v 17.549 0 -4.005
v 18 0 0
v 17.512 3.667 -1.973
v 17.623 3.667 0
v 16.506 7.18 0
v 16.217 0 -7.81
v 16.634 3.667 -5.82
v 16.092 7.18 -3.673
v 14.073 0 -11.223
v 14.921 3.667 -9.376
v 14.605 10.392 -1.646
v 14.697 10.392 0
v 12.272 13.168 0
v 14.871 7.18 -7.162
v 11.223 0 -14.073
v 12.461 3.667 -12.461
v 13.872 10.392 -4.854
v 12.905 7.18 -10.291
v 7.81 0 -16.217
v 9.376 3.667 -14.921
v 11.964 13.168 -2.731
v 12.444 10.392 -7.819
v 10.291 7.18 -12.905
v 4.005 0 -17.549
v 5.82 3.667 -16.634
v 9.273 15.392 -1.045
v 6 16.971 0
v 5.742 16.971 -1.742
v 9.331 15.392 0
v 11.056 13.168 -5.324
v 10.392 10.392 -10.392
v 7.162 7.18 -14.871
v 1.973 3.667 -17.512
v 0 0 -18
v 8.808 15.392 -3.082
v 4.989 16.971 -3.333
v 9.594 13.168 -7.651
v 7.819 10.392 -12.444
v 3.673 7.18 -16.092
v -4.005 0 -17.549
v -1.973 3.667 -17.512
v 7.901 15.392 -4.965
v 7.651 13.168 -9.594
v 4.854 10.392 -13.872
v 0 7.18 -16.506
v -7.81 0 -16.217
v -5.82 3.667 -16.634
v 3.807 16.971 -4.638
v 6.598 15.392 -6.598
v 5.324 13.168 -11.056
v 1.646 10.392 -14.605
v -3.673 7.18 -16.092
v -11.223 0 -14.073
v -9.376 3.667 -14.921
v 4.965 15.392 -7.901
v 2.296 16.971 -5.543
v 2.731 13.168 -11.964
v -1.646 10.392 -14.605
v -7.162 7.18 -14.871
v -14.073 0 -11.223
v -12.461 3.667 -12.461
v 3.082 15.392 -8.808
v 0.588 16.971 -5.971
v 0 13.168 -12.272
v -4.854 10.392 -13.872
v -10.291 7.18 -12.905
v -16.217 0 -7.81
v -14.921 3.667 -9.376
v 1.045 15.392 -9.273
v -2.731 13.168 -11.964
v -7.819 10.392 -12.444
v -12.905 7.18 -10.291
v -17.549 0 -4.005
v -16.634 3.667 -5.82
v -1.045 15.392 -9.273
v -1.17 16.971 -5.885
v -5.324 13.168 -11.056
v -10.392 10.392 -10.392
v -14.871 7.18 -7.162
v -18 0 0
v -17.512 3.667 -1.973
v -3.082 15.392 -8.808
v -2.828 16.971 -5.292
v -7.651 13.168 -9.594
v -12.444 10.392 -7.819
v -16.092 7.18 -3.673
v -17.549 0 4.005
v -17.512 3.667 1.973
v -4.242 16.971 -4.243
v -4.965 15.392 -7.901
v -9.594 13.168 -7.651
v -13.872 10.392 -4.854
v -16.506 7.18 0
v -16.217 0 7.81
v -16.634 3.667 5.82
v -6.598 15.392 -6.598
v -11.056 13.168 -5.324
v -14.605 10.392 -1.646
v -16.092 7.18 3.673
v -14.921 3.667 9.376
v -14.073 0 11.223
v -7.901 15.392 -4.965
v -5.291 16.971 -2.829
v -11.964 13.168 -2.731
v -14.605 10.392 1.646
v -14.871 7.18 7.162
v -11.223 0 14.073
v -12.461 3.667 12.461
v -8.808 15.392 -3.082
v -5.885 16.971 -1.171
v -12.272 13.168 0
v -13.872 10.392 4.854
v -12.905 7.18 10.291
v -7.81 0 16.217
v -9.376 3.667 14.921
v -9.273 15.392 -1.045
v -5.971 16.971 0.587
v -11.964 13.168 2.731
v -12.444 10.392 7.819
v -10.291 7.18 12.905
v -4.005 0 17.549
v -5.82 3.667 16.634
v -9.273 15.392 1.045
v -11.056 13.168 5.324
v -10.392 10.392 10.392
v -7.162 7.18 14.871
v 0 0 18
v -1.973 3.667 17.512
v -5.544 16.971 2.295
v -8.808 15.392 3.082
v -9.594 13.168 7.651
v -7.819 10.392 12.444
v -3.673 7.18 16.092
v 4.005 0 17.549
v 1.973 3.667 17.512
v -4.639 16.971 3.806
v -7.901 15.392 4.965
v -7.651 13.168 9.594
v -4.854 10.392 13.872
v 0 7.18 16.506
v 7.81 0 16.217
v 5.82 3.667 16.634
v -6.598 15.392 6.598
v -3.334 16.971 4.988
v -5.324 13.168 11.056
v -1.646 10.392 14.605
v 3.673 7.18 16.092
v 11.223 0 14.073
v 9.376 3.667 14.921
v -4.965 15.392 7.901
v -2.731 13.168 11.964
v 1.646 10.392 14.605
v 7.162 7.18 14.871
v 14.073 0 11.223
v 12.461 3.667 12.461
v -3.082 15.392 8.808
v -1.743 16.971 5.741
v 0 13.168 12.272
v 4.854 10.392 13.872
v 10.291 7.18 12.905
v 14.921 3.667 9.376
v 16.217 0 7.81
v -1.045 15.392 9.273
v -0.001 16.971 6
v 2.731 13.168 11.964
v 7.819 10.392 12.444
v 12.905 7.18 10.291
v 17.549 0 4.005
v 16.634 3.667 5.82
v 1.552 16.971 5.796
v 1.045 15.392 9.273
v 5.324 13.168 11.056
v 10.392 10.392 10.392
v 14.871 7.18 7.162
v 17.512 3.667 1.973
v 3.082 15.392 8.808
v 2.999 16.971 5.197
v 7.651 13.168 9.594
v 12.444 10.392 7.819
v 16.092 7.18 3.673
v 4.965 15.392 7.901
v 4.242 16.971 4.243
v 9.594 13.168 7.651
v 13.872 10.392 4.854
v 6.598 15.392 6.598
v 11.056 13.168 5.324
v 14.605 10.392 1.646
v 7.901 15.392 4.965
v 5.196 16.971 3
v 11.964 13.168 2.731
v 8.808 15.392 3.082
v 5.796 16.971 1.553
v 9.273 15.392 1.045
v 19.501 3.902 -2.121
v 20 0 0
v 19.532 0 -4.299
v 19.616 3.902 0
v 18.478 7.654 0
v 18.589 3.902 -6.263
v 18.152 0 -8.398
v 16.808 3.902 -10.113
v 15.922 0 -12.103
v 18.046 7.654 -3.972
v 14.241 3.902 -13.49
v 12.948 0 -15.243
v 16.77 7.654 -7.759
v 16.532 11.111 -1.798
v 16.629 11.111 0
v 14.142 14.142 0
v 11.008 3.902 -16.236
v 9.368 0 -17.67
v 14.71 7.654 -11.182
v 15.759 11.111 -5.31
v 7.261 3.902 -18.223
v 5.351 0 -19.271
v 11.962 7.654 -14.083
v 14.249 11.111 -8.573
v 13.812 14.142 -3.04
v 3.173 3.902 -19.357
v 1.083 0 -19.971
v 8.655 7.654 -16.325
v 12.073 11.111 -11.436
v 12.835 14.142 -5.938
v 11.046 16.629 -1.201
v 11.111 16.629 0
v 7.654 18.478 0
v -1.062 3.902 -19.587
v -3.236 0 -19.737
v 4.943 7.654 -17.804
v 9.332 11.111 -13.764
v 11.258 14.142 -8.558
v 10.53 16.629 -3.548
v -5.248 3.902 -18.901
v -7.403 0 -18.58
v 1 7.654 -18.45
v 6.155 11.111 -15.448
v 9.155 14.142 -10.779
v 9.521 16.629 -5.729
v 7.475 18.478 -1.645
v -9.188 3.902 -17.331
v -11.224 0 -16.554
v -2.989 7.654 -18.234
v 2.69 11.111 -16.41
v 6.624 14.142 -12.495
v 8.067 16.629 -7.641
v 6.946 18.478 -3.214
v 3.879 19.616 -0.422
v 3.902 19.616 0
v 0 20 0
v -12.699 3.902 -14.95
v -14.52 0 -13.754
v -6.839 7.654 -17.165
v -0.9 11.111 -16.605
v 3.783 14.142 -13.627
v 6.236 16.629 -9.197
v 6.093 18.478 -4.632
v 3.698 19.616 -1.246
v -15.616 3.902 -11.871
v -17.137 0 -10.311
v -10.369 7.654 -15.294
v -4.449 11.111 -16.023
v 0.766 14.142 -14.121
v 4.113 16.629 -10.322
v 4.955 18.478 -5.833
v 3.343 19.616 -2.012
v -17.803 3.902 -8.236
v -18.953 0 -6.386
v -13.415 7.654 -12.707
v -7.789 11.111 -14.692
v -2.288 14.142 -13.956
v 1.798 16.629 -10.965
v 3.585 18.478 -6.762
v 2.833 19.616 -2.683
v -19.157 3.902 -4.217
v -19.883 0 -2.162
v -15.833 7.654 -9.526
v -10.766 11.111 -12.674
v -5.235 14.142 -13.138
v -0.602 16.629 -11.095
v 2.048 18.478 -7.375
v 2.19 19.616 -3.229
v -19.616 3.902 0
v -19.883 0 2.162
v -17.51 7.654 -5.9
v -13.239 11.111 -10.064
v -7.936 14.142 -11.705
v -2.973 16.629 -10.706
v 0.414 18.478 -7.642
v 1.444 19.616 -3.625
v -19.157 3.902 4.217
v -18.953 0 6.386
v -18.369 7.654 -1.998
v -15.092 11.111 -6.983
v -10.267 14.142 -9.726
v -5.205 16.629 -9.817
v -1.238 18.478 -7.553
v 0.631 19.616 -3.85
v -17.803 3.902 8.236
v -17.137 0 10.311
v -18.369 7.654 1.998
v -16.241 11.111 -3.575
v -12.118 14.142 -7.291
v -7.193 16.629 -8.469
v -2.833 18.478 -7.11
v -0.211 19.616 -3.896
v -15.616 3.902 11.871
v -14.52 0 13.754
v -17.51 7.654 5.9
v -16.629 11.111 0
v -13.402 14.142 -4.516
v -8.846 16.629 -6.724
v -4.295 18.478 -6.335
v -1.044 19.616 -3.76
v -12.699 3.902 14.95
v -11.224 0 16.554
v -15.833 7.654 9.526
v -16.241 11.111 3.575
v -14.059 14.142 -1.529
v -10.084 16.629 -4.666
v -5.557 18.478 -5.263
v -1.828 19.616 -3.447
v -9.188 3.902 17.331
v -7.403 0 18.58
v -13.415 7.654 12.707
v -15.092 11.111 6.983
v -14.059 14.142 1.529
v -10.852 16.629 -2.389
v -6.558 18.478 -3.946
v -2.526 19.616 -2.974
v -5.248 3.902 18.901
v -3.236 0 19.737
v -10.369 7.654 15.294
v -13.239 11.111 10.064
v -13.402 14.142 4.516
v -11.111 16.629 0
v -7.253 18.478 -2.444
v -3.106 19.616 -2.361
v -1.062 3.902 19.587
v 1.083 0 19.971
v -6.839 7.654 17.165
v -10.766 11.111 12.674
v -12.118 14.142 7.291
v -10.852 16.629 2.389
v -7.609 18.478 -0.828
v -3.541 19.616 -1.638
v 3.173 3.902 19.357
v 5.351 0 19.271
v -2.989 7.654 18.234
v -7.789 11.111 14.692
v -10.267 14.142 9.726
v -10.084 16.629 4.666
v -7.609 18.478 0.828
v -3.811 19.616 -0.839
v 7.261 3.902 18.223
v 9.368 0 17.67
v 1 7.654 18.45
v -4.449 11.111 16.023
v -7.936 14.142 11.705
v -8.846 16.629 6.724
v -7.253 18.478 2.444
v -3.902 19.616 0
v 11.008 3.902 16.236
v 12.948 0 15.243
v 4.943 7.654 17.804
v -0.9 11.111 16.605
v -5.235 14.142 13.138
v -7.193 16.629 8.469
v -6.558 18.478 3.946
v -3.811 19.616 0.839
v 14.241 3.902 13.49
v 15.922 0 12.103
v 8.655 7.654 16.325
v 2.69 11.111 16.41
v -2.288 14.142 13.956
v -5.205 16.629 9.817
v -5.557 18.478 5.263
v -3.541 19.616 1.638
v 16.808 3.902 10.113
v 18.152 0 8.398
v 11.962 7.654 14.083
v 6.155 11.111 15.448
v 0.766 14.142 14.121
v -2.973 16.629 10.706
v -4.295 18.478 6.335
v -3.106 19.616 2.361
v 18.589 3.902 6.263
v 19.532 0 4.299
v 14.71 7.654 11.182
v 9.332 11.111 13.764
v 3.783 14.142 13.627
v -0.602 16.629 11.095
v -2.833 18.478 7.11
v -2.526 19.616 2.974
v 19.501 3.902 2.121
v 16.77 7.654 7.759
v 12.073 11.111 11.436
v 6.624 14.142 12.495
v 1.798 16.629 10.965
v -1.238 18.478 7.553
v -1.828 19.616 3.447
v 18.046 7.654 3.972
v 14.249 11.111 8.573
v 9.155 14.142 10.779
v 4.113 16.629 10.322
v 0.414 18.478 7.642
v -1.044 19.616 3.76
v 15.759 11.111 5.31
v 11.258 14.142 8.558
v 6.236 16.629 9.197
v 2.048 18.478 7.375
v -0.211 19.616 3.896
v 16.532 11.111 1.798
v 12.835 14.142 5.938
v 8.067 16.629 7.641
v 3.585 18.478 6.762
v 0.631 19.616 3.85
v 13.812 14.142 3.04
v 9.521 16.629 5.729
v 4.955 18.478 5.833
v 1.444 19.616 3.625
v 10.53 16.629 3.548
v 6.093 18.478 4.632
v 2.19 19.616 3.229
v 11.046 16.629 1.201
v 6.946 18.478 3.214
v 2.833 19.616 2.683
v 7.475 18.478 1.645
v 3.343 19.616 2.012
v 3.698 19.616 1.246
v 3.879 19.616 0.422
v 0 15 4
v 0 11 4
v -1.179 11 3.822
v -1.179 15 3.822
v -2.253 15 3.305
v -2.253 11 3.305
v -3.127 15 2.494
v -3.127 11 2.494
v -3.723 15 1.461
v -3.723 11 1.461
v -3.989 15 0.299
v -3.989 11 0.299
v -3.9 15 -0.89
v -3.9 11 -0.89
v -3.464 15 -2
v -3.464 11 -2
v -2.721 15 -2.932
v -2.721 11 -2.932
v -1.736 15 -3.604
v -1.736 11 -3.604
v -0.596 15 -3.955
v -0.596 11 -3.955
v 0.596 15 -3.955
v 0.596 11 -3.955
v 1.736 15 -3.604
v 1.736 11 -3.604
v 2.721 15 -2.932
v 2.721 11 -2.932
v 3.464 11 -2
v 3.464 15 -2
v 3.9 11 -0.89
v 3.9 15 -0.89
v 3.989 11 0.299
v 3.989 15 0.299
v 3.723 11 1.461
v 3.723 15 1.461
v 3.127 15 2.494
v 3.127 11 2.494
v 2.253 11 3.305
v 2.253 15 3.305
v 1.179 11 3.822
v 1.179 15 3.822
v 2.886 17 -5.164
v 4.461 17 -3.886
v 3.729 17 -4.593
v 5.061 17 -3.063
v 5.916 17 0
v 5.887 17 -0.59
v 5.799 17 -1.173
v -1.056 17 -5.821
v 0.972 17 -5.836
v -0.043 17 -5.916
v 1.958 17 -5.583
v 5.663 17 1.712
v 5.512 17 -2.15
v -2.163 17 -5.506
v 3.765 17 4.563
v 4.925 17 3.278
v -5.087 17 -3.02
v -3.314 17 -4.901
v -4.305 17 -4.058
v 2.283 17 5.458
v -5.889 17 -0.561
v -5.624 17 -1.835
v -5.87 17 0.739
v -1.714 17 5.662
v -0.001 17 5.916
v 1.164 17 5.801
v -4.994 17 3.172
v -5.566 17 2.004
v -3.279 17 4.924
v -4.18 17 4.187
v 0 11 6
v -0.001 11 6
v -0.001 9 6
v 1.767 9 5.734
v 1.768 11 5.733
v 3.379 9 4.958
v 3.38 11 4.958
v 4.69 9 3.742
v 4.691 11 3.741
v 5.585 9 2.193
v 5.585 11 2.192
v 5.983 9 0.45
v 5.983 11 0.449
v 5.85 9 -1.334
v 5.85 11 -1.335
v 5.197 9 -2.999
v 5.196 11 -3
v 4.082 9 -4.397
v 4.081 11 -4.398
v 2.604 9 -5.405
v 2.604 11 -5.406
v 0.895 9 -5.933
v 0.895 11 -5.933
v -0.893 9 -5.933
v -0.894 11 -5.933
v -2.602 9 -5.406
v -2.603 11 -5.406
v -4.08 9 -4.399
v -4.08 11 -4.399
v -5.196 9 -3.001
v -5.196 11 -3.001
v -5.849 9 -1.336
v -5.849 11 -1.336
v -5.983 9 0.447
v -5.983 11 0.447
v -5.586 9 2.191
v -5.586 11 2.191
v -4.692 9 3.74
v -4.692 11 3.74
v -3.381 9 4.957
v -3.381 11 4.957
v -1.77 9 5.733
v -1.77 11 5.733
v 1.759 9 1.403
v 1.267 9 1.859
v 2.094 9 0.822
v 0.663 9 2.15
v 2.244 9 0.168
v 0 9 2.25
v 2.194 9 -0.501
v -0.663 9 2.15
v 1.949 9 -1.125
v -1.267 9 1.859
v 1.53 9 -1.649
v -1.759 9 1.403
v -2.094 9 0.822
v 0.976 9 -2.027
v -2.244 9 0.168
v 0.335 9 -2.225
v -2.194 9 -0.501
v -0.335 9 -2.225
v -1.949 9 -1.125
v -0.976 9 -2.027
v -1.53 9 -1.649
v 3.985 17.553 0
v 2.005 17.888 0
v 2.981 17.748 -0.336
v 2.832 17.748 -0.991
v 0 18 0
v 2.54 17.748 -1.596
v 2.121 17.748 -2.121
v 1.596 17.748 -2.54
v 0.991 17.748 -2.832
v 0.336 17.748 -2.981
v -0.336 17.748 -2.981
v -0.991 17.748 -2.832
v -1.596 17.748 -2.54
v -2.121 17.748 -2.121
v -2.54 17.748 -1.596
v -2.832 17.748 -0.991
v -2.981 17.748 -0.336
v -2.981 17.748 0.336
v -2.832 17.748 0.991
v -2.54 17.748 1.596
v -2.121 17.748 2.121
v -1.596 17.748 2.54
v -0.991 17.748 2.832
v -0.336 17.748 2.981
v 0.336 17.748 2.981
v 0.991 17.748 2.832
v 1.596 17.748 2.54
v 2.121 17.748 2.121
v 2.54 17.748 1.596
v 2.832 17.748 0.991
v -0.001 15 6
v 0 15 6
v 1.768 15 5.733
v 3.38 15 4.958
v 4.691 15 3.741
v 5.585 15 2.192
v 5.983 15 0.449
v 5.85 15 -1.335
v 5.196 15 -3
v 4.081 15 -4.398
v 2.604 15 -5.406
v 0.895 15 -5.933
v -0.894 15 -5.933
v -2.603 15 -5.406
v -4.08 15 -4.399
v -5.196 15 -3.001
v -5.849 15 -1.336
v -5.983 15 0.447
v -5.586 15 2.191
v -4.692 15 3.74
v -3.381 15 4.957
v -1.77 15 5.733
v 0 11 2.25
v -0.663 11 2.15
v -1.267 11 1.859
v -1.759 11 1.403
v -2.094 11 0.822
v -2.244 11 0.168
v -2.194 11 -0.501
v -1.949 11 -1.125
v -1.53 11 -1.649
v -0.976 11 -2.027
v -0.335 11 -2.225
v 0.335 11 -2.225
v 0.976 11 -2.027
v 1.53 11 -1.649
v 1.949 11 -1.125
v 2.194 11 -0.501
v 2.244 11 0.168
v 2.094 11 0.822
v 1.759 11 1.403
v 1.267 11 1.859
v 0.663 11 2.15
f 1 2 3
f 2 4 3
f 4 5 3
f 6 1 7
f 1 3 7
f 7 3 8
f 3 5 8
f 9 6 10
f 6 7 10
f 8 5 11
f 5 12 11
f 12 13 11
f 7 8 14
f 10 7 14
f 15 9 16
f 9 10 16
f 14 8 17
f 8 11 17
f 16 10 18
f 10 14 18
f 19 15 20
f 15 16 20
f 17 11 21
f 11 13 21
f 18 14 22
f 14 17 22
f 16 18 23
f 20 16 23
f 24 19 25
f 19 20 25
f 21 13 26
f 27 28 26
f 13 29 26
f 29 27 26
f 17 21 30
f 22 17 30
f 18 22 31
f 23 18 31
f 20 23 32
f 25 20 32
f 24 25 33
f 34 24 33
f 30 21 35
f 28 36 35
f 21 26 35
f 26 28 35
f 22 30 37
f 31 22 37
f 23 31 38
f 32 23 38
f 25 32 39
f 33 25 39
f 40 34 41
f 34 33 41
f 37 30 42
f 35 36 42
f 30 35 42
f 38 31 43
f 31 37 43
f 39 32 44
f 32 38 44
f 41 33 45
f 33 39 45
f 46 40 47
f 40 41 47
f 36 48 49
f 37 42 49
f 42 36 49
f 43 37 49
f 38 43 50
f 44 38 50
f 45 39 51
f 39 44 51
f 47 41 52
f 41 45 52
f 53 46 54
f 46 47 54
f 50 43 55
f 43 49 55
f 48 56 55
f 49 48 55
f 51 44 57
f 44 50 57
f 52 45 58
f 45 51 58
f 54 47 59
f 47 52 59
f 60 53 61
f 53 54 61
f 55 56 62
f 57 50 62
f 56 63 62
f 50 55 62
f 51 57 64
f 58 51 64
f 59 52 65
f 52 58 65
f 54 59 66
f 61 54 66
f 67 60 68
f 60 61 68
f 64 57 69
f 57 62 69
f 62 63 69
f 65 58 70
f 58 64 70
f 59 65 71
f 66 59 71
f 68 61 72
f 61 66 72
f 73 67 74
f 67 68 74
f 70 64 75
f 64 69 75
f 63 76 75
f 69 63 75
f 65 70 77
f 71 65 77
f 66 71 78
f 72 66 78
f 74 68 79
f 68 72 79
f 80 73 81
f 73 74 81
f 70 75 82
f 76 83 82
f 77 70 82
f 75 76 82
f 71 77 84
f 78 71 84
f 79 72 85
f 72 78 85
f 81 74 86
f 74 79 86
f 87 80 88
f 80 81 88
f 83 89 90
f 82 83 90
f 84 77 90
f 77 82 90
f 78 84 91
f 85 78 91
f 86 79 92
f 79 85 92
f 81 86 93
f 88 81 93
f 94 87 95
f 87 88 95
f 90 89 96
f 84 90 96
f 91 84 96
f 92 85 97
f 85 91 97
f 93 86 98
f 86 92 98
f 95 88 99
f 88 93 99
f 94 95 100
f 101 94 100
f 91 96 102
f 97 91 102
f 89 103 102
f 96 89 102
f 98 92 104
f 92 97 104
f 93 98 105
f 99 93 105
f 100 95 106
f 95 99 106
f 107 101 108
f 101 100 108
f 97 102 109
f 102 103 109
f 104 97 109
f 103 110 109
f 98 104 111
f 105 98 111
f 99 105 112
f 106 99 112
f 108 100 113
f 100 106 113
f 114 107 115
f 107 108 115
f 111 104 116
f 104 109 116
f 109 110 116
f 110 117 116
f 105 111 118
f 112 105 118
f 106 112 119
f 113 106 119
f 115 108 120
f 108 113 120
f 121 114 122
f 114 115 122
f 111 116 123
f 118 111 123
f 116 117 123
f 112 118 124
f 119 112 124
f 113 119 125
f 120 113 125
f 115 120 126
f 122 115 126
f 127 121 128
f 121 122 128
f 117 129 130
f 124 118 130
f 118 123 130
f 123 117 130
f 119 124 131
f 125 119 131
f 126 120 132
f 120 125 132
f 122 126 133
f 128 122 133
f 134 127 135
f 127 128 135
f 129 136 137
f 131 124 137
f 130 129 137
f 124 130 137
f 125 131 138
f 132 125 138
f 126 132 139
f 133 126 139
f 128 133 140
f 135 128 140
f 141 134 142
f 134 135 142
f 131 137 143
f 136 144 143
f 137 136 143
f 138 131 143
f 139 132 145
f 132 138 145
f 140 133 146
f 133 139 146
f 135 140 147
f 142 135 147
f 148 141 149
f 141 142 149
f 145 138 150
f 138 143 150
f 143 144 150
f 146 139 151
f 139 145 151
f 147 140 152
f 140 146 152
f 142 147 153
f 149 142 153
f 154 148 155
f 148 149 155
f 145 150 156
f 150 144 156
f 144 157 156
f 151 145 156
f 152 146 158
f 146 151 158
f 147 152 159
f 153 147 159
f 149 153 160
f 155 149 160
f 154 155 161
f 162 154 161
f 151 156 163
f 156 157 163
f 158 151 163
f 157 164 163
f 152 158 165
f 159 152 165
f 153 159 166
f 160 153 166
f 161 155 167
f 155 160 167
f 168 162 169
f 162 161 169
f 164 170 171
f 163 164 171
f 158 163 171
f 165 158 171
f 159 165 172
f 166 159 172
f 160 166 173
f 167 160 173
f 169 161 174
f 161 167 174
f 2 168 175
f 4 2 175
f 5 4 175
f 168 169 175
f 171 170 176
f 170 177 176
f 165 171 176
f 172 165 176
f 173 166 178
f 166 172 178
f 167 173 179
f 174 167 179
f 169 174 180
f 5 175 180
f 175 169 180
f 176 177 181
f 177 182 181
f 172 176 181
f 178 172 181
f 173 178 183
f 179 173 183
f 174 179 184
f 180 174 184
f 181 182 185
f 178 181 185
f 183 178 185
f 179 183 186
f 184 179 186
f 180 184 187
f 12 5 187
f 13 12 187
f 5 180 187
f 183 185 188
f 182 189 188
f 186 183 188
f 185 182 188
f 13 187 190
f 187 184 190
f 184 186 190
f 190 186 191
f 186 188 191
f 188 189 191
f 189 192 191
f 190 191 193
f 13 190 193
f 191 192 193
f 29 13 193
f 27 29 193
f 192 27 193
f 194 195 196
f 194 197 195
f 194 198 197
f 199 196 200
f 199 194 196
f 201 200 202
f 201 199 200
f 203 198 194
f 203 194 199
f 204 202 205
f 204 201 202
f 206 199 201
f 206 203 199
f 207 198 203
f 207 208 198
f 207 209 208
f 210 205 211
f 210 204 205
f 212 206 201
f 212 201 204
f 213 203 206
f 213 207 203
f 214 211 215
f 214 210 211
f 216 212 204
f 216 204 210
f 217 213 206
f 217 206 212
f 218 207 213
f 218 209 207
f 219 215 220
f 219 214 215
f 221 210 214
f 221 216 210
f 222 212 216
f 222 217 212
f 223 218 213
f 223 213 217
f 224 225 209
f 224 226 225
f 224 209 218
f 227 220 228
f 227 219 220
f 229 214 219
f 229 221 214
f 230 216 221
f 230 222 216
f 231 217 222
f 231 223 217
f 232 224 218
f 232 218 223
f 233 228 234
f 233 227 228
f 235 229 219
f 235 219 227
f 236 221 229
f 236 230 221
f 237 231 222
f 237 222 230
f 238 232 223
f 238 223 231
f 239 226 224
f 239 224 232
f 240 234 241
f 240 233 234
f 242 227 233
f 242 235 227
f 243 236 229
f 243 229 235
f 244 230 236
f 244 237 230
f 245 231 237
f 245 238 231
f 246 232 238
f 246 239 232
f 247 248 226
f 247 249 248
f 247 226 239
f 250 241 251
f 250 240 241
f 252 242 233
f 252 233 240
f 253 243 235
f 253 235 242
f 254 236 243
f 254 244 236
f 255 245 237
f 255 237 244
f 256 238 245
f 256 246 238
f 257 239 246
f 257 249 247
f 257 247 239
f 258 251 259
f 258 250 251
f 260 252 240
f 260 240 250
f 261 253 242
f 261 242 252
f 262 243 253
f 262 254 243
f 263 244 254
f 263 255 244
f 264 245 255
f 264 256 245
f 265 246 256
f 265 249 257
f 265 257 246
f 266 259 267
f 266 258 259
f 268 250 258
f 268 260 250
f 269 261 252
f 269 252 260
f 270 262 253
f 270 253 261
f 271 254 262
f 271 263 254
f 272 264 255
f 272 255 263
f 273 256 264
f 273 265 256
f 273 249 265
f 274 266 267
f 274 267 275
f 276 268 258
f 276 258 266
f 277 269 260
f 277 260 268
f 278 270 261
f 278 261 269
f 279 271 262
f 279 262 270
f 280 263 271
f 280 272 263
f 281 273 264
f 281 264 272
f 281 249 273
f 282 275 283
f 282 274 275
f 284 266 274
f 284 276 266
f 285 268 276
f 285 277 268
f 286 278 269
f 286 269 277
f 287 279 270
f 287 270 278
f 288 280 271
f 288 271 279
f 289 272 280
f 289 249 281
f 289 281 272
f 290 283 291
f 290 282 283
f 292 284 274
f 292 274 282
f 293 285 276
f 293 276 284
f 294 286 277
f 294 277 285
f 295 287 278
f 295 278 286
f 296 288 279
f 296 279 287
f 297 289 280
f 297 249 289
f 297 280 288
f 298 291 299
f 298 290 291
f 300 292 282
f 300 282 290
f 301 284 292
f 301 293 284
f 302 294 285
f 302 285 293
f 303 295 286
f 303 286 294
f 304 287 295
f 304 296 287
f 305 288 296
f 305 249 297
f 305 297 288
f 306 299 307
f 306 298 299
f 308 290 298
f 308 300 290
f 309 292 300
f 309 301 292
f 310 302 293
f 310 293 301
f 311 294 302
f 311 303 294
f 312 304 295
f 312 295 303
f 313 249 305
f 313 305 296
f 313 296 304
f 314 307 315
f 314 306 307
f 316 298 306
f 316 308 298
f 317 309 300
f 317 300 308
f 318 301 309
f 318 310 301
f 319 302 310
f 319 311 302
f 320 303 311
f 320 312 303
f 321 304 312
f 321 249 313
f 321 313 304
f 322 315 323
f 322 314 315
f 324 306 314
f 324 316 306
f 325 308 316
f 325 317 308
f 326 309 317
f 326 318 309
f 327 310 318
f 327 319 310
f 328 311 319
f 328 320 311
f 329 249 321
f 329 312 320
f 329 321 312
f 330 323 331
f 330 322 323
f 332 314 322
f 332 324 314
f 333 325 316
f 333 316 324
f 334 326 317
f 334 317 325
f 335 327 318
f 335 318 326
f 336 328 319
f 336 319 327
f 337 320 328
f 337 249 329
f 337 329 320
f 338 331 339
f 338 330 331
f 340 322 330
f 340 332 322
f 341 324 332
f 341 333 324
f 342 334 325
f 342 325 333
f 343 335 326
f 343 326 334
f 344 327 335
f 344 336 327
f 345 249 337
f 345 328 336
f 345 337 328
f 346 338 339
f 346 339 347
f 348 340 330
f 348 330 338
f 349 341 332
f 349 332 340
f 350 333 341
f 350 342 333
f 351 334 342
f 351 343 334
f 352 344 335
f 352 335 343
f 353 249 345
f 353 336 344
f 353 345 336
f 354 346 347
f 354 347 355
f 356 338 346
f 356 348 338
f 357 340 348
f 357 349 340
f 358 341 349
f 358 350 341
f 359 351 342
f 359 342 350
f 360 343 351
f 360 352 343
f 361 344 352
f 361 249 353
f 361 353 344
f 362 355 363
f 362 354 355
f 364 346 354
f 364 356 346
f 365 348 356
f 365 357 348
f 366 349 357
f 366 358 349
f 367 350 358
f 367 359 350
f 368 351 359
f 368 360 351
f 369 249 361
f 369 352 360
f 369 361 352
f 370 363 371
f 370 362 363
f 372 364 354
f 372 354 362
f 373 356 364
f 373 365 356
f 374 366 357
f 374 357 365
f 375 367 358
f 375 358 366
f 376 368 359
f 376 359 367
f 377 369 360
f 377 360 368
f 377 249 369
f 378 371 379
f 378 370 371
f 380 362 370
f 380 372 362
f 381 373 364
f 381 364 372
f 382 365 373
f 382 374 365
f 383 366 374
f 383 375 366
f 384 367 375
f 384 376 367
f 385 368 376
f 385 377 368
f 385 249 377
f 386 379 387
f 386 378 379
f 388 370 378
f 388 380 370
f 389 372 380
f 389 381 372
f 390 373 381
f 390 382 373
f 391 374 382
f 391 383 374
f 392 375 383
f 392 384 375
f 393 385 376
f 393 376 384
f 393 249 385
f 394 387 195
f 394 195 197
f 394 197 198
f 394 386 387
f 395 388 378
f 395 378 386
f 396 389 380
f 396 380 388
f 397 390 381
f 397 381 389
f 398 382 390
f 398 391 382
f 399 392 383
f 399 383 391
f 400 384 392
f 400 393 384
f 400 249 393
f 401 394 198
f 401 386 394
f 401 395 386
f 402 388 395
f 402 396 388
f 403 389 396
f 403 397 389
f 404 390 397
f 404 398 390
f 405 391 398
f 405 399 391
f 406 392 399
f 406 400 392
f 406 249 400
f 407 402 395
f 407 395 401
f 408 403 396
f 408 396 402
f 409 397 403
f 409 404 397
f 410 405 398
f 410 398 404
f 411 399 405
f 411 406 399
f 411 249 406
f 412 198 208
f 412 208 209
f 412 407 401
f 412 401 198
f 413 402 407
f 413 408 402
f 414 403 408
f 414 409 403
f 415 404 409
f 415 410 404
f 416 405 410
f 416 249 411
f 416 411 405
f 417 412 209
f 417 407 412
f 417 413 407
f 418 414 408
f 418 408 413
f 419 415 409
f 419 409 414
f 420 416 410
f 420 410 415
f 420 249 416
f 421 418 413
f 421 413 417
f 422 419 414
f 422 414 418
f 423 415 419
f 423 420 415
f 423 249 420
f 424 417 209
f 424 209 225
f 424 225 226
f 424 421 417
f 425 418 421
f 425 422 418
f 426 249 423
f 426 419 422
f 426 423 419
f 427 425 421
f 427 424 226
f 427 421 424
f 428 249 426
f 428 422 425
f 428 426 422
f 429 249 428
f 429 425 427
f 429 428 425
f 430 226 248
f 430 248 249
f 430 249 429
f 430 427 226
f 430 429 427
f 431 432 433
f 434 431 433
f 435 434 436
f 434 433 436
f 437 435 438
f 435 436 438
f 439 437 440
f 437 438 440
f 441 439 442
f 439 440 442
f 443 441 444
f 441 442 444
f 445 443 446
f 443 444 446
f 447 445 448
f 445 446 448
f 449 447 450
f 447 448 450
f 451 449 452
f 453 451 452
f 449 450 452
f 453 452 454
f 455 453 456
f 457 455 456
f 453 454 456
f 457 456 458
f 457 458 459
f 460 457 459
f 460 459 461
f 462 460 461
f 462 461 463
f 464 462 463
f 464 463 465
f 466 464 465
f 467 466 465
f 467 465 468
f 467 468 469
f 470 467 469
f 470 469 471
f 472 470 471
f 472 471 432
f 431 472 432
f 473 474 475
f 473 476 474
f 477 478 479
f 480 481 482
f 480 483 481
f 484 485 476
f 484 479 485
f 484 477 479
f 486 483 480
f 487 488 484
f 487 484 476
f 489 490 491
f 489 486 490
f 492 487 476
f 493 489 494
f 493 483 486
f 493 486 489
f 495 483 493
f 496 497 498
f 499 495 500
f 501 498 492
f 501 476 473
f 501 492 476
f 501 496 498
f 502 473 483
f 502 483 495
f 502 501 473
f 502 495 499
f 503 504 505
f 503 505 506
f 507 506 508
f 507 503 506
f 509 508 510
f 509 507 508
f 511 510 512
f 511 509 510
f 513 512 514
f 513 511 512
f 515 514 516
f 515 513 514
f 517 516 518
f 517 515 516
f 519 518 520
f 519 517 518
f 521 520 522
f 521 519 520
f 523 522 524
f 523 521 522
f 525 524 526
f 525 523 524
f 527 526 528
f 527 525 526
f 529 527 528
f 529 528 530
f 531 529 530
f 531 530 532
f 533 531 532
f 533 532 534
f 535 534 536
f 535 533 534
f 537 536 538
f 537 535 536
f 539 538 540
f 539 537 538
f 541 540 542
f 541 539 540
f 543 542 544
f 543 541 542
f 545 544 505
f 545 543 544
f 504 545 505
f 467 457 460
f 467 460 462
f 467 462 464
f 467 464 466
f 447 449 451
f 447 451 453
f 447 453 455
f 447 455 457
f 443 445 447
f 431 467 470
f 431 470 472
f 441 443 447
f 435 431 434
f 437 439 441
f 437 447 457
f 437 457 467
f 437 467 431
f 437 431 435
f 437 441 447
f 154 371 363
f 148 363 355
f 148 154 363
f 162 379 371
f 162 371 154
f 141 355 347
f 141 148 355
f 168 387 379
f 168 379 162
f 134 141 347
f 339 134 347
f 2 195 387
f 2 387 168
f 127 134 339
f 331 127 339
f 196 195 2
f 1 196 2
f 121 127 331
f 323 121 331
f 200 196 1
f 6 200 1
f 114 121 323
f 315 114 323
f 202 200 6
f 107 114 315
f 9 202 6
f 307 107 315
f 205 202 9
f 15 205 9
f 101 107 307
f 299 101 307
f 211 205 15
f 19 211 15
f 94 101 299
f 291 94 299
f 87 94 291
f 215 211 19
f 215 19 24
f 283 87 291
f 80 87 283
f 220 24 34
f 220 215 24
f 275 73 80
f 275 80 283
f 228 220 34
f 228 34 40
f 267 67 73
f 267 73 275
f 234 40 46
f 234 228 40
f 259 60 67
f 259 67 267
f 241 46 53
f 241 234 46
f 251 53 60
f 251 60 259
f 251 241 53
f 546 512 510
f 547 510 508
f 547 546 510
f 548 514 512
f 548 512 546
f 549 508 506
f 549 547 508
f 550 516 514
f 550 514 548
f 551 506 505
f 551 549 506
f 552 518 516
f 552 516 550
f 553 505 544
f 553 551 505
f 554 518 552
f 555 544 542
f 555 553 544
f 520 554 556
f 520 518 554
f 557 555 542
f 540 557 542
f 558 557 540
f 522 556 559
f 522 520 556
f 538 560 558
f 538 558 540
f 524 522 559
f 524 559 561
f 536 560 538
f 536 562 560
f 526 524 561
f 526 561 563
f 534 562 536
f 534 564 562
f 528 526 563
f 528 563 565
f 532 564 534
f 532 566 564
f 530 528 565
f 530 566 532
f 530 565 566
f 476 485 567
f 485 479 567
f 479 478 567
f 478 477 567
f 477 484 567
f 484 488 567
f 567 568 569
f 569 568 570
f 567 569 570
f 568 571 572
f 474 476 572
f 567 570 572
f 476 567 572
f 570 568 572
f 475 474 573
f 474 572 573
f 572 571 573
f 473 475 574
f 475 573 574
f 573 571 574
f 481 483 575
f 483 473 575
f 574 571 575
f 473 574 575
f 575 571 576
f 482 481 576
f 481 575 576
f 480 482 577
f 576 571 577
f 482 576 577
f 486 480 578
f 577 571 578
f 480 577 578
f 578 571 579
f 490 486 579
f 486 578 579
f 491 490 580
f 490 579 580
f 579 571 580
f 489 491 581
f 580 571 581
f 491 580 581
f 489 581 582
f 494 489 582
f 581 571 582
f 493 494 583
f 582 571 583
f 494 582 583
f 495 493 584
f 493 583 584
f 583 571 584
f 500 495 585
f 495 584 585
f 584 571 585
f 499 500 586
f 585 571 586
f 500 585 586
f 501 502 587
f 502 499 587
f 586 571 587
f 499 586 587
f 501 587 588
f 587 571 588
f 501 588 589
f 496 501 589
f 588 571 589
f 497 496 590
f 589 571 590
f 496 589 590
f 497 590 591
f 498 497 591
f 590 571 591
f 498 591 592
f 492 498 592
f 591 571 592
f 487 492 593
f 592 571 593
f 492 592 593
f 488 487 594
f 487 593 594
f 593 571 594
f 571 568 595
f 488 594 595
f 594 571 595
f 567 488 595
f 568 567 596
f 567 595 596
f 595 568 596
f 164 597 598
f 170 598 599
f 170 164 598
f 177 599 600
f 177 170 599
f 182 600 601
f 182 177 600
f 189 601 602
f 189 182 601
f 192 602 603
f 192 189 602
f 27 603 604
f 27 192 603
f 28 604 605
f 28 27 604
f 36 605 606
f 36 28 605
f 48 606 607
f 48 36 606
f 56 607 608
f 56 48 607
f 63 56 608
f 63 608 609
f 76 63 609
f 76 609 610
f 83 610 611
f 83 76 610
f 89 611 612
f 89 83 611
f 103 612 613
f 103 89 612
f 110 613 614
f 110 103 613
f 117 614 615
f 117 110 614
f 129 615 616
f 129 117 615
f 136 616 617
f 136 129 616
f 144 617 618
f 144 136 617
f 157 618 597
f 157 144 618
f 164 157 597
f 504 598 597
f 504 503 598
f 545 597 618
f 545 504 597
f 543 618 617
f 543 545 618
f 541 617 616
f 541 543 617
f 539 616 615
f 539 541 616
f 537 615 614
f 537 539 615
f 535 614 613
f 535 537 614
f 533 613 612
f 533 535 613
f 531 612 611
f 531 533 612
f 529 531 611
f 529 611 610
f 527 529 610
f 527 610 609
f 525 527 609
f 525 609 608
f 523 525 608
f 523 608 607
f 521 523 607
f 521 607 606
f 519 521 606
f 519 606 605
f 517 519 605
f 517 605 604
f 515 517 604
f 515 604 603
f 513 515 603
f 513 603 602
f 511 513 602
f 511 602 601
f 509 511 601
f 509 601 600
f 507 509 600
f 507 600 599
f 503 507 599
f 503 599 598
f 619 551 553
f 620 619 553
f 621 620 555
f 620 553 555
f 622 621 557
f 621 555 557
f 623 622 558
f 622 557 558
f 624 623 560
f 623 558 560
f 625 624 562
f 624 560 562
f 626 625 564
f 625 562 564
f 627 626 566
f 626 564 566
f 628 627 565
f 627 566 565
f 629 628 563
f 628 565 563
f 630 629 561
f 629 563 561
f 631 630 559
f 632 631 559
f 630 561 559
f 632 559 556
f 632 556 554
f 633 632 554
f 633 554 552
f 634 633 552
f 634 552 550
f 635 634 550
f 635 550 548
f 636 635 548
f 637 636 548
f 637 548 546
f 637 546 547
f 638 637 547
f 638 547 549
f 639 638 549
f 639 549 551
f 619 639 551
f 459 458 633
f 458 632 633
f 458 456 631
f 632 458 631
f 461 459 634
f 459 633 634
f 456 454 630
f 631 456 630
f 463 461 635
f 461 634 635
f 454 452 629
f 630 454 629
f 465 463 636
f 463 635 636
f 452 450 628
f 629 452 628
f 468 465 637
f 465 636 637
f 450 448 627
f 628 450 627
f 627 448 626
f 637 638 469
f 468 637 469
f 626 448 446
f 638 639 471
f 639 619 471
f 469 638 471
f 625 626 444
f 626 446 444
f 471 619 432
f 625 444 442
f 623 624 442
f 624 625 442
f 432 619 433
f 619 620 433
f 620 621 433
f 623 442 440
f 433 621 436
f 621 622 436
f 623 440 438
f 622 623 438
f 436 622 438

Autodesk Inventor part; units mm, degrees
ref_plane "YZ Plane" through (0, 0, 0) normal (1, 0, 0) x (0, 1, 0)
ref_plane "XY Plane" through (0, 0, 0) normal (0, 0, 1) x (1, 0, 0)
ref_plane "Work Plane1" through (0, 15, 0) normal (0, 1, 0) x (-1, 0, 0)
sketch "Sketch1" plane through (0, 0, 0) normal (0, 0, 1) x (1, 0, 0)
  line L0 (0, 0) -> (0, 20)
  line L1 (0, 0) -> (20, 0)
  arc A0 (20, 0) -> (0, 20) centre (0, 0) ccw
  line L2 (0, -4.8284) -> (0, 28.9706) projected
  dimension "d2" = 20
revolve "Revolution1" add sketch "Sketch1" angle 360 about axis through (0, -10, 0) along (0, 1, 0)
sketch "Sketch2" plane through (0, 15, 0) normal (0, 1, 0) x (-1, 0, 0)
  point P0 (0, 0)
  point P1 (0, 0)
hole "Hole1" at (0, 15, 0) direction (0, -1, 0) diameter 4.5 end through all counterbore diameter 8 counterbore depth 4 clearance for "Socket Head Cap Screw" size "M4" standard "Ansi Metric M Profile"
shell "Shell1" thickness 2 removed faces 1 at (13.8841, 0, 1.6858)
sketch "Sketch3" plane through (0, 0, 0) normal (0, -1, 0) x (1, 0, 0)
  circle A0 centre (0, 0) radius 4.25 projected
  circle A1 centre (0, 0) radius 2.25 projected
extrude "Extrusion1" cut sketch "Sketch3" against normal blind 9
properties part number "Ball_Upper Half" material "Nylon 6/6"
